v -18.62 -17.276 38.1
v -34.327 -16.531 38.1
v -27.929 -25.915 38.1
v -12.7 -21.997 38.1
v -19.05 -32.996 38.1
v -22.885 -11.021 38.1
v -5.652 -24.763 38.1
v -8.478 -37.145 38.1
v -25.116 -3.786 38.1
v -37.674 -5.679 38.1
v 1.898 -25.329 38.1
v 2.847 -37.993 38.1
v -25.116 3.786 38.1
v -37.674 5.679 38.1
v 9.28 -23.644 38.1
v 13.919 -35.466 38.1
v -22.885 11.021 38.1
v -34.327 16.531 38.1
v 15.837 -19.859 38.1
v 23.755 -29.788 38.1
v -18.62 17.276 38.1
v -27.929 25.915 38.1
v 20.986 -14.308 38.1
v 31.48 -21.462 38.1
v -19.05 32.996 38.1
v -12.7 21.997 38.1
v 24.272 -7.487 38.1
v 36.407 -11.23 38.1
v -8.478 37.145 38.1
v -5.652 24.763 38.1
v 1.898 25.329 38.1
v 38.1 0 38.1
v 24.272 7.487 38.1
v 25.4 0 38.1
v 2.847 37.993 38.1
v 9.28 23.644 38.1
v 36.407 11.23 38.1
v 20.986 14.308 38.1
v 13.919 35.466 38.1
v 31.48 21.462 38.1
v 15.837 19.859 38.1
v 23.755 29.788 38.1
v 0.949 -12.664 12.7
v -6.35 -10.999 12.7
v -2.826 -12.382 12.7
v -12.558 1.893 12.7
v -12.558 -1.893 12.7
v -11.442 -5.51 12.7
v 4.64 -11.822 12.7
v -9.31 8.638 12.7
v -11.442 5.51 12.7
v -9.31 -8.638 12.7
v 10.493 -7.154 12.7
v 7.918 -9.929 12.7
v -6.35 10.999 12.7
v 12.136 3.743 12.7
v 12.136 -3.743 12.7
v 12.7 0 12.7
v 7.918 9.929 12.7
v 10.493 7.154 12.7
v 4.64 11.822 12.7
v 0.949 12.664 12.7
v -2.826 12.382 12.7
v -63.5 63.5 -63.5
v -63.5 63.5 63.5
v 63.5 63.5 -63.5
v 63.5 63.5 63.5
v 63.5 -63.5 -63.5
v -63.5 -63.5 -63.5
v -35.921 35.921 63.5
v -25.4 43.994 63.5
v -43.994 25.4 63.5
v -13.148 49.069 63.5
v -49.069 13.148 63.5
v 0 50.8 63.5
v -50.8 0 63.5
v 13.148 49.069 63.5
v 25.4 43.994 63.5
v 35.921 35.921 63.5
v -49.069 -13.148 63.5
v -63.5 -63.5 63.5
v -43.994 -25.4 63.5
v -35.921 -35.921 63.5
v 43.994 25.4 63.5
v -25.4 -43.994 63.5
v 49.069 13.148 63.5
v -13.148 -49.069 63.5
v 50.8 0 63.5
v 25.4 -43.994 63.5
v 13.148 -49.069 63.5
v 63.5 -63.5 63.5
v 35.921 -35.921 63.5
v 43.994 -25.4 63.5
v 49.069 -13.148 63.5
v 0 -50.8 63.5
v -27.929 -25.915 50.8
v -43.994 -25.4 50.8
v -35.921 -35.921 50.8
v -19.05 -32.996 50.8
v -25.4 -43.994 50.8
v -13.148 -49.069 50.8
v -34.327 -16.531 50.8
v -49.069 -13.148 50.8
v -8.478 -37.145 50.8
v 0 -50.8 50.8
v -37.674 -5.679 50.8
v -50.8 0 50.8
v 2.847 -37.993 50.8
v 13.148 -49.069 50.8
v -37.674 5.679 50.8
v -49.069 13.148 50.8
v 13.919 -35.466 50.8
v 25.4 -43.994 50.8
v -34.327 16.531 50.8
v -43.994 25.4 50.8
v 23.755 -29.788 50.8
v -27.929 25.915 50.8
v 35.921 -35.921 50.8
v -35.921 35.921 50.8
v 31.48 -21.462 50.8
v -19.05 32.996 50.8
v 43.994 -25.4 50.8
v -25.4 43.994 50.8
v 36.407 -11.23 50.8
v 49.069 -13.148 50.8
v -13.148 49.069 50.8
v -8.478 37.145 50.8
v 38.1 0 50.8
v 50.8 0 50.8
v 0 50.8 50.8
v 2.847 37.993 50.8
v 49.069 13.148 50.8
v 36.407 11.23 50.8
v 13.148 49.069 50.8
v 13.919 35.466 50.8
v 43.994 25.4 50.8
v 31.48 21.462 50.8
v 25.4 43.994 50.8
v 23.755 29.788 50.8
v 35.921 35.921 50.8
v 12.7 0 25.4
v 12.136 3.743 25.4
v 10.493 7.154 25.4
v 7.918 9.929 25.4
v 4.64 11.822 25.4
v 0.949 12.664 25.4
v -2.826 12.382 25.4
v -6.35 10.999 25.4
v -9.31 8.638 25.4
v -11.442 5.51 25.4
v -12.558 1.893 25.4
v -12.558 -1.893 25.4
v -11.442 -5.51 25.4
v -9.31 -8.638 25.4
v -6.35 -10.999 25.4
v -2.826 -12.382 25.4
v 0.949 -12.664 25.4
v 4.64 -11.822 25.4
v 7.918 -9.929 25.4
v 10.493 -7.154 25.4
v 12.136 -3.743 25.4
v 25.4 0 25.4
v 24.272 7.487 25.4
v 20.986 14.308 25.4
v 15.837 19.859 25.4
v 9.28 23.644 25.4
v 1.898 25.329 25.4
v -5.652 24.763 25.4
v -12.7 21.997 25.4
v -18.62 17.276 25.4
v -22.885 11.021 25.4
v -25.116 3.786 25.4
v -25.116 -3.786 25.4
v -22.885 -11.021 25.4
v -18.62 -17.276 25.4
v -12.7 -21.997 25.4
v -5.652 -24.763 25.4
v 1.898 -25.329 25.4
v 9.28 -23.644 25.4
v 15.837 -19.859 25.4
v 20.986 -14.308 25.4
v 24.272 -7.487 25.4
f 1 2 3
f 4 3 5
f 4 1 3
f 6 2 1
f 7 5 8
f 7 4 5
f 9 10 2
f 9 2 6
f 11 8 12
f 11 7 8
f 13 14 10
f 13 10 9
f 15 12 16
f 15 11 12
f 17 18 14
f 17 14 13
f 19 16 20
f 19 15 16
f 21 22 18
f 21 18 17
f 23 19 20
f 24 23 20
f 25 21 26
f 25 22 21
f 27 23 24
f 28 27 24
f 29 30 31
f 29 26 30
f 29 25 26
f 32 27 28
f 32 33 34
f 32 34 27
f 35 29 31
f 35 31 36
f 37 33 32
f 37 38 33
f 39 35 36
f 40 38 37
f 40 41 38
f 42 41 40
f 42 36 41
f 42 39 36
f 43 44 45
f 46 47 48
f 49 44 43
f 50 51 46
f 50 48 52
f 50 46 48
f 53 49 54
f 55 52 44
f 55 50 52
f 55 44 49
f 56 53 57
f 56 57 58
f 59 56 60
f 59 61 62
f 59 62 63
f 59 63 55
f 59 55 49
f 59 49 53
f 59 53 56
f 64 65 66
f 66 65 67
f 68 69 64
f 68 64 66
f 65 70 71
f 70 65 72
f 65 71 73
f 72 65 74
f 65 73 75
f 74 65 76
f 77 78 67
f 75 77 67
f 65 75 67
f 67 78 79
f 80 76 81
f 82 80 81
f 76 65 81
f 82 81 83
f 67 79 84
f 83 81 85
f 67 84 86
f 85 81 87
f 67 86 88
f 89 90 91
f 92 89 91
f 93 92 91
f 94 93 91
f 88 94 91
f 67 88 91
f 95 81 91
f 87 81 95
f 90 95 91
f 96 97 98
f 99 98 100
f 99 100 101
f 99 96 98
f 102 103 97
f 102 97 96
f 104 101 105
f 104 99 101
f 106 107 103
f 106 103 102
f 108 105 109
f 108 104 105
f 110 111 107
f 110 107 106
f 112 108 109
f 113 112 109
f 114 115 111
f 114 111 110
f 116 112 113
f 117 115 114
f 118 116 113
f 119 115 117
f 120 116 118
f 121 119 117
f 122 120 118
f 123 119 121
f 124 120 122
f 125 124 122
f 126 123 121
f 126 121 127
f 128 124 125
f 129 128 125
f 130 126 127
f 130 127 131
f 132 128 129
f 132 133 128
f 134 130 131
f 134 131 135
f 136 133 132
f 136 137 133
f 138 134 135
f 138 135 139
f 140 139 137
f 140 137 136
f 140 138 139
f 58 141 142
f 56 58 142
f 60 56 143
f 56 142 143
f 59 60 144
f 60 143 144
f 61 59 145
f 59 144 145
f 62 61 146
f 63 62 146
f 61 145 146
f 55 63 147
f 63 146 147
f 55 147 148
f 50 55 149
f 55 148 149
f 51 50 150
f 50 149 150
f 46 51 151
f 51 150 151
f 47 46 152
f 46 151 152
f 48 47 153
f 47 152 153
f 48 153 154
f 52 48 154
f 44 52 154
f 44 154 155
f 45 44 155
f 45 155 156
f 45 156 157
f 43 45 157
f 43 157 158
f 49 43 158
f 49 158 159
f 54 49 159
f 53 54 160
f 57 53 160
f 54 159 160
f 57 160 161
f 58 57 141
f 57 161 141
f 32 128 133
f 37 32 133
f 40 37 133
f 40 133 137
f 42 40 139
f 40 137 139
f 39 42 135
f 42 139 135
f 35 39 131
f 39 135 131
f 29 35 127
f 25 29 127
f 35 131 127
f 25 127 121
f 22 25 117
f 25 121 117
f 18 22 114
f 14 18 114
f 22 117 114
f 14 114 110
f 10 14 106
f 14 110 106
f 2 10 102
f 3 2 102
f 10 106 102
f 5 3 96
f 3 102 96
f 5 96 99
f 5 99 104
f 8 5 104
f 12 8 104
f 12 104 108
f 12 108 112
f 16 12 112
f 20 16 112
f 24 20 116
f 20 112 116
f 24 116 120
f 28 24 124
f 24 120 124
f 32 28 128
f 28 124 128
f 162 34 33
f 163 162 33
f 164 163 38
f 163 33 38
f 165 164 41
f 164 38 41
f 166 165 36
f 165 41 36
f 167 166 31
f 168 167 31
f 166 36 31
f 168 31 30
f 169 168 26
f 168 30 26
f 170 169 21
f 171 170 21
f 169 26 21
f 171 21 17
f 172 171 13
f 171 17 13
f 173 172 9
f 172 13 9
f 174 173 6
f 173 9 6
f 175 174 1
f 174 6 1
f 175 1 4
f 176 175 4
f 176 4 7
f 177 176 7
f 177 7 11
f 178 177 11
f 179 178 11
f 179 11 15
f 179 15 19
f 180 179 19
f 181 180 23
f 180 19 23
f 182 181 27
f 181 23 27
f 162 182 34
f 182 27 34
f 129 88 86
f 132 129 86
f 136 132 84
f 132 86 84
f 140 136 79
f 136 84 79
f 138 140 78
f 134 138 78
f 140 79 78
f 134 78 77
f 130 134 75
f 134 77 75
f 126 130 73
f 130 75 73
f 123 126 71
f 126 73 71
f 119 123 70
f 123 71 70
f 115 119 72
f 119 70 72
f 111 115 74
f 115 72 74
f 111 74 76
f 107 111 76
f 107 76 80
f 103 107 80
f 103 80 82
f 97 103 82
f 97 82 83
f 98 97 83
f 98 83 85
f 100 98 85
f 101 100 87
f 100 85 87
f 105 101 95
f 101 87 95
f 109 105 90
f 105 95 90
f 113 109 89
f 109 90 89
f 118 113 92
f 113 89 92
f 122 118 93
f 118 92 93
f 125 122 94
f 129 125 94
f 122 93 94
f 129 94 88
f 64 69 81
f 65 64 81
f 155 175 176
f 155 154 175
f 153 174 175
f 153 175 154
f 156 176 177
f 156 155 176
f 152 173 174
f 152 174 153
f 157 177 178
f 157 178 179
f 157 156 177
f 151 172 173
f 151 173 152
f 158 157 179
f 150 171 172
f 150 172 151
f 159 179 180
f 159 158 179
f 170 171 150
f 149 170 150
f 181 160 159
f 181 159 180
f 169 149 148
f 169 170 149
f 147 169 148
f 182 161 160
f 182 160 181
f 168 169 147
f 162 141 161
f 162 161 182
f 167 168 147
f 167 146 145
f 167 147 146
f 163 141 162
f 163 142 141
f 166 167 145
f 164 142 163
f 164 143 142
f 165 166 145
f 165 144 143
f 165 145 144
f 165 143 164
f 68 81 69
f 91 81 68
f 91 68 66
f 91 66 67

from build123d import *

# Parameters (mm, degrees)
F0_W     = 127
F0_H     = 127
F1_DEPTH = 63.5
F2_R     = 50.8
F3_DEPTH = 12.7
F4_R     = 38.1
F5_DEPTH = 12.7
F6_R     = 25.4
F7_DEPTH = 12.7
F8_R     = 12.7
F9_DEPTH = 12.7


with BuildPart() as f1:
    # F0 (on Front) → F1 (new body, symmetric)
    with BuildSketch(Plane.XZ):
        Rectangle(F0_W, F0_H)
    extrude(amount=F1_DEPTH, both=True)

    # F2 (on face) → F3 (cut)
    with BuildSketch(Plane.XY.offset(63.5)):
        Circle(F2_R)
    extrude(amount=-F3_DEPTH, mode=Mode.SUBTRACT)

    # F4 (on face) → F5 (cut)
    with BuildSketch(Plane.XY.offset(50.8)):
        Circle(F4_R)
    extrude(amount=-F5_DEPTH, mode=Mode.SUBTRACT)

    # F6 (on face) → F7 (cut)
    with BuildSketch(Plane.XY.offset(38.1)):
        Circle(F6_R)
    extrude(amount=-F7_DEPTH, mode=Mode.SUBTRACT)

    # F8 (on face) → F9 (cut)
    with BuildSketch(Plane.XY.offset(25.4)):
        Circle(F8_R)
    extrude(amount=-F9_DEPTH, mode=Mode.SUBTRACT)


solid = f1.part
